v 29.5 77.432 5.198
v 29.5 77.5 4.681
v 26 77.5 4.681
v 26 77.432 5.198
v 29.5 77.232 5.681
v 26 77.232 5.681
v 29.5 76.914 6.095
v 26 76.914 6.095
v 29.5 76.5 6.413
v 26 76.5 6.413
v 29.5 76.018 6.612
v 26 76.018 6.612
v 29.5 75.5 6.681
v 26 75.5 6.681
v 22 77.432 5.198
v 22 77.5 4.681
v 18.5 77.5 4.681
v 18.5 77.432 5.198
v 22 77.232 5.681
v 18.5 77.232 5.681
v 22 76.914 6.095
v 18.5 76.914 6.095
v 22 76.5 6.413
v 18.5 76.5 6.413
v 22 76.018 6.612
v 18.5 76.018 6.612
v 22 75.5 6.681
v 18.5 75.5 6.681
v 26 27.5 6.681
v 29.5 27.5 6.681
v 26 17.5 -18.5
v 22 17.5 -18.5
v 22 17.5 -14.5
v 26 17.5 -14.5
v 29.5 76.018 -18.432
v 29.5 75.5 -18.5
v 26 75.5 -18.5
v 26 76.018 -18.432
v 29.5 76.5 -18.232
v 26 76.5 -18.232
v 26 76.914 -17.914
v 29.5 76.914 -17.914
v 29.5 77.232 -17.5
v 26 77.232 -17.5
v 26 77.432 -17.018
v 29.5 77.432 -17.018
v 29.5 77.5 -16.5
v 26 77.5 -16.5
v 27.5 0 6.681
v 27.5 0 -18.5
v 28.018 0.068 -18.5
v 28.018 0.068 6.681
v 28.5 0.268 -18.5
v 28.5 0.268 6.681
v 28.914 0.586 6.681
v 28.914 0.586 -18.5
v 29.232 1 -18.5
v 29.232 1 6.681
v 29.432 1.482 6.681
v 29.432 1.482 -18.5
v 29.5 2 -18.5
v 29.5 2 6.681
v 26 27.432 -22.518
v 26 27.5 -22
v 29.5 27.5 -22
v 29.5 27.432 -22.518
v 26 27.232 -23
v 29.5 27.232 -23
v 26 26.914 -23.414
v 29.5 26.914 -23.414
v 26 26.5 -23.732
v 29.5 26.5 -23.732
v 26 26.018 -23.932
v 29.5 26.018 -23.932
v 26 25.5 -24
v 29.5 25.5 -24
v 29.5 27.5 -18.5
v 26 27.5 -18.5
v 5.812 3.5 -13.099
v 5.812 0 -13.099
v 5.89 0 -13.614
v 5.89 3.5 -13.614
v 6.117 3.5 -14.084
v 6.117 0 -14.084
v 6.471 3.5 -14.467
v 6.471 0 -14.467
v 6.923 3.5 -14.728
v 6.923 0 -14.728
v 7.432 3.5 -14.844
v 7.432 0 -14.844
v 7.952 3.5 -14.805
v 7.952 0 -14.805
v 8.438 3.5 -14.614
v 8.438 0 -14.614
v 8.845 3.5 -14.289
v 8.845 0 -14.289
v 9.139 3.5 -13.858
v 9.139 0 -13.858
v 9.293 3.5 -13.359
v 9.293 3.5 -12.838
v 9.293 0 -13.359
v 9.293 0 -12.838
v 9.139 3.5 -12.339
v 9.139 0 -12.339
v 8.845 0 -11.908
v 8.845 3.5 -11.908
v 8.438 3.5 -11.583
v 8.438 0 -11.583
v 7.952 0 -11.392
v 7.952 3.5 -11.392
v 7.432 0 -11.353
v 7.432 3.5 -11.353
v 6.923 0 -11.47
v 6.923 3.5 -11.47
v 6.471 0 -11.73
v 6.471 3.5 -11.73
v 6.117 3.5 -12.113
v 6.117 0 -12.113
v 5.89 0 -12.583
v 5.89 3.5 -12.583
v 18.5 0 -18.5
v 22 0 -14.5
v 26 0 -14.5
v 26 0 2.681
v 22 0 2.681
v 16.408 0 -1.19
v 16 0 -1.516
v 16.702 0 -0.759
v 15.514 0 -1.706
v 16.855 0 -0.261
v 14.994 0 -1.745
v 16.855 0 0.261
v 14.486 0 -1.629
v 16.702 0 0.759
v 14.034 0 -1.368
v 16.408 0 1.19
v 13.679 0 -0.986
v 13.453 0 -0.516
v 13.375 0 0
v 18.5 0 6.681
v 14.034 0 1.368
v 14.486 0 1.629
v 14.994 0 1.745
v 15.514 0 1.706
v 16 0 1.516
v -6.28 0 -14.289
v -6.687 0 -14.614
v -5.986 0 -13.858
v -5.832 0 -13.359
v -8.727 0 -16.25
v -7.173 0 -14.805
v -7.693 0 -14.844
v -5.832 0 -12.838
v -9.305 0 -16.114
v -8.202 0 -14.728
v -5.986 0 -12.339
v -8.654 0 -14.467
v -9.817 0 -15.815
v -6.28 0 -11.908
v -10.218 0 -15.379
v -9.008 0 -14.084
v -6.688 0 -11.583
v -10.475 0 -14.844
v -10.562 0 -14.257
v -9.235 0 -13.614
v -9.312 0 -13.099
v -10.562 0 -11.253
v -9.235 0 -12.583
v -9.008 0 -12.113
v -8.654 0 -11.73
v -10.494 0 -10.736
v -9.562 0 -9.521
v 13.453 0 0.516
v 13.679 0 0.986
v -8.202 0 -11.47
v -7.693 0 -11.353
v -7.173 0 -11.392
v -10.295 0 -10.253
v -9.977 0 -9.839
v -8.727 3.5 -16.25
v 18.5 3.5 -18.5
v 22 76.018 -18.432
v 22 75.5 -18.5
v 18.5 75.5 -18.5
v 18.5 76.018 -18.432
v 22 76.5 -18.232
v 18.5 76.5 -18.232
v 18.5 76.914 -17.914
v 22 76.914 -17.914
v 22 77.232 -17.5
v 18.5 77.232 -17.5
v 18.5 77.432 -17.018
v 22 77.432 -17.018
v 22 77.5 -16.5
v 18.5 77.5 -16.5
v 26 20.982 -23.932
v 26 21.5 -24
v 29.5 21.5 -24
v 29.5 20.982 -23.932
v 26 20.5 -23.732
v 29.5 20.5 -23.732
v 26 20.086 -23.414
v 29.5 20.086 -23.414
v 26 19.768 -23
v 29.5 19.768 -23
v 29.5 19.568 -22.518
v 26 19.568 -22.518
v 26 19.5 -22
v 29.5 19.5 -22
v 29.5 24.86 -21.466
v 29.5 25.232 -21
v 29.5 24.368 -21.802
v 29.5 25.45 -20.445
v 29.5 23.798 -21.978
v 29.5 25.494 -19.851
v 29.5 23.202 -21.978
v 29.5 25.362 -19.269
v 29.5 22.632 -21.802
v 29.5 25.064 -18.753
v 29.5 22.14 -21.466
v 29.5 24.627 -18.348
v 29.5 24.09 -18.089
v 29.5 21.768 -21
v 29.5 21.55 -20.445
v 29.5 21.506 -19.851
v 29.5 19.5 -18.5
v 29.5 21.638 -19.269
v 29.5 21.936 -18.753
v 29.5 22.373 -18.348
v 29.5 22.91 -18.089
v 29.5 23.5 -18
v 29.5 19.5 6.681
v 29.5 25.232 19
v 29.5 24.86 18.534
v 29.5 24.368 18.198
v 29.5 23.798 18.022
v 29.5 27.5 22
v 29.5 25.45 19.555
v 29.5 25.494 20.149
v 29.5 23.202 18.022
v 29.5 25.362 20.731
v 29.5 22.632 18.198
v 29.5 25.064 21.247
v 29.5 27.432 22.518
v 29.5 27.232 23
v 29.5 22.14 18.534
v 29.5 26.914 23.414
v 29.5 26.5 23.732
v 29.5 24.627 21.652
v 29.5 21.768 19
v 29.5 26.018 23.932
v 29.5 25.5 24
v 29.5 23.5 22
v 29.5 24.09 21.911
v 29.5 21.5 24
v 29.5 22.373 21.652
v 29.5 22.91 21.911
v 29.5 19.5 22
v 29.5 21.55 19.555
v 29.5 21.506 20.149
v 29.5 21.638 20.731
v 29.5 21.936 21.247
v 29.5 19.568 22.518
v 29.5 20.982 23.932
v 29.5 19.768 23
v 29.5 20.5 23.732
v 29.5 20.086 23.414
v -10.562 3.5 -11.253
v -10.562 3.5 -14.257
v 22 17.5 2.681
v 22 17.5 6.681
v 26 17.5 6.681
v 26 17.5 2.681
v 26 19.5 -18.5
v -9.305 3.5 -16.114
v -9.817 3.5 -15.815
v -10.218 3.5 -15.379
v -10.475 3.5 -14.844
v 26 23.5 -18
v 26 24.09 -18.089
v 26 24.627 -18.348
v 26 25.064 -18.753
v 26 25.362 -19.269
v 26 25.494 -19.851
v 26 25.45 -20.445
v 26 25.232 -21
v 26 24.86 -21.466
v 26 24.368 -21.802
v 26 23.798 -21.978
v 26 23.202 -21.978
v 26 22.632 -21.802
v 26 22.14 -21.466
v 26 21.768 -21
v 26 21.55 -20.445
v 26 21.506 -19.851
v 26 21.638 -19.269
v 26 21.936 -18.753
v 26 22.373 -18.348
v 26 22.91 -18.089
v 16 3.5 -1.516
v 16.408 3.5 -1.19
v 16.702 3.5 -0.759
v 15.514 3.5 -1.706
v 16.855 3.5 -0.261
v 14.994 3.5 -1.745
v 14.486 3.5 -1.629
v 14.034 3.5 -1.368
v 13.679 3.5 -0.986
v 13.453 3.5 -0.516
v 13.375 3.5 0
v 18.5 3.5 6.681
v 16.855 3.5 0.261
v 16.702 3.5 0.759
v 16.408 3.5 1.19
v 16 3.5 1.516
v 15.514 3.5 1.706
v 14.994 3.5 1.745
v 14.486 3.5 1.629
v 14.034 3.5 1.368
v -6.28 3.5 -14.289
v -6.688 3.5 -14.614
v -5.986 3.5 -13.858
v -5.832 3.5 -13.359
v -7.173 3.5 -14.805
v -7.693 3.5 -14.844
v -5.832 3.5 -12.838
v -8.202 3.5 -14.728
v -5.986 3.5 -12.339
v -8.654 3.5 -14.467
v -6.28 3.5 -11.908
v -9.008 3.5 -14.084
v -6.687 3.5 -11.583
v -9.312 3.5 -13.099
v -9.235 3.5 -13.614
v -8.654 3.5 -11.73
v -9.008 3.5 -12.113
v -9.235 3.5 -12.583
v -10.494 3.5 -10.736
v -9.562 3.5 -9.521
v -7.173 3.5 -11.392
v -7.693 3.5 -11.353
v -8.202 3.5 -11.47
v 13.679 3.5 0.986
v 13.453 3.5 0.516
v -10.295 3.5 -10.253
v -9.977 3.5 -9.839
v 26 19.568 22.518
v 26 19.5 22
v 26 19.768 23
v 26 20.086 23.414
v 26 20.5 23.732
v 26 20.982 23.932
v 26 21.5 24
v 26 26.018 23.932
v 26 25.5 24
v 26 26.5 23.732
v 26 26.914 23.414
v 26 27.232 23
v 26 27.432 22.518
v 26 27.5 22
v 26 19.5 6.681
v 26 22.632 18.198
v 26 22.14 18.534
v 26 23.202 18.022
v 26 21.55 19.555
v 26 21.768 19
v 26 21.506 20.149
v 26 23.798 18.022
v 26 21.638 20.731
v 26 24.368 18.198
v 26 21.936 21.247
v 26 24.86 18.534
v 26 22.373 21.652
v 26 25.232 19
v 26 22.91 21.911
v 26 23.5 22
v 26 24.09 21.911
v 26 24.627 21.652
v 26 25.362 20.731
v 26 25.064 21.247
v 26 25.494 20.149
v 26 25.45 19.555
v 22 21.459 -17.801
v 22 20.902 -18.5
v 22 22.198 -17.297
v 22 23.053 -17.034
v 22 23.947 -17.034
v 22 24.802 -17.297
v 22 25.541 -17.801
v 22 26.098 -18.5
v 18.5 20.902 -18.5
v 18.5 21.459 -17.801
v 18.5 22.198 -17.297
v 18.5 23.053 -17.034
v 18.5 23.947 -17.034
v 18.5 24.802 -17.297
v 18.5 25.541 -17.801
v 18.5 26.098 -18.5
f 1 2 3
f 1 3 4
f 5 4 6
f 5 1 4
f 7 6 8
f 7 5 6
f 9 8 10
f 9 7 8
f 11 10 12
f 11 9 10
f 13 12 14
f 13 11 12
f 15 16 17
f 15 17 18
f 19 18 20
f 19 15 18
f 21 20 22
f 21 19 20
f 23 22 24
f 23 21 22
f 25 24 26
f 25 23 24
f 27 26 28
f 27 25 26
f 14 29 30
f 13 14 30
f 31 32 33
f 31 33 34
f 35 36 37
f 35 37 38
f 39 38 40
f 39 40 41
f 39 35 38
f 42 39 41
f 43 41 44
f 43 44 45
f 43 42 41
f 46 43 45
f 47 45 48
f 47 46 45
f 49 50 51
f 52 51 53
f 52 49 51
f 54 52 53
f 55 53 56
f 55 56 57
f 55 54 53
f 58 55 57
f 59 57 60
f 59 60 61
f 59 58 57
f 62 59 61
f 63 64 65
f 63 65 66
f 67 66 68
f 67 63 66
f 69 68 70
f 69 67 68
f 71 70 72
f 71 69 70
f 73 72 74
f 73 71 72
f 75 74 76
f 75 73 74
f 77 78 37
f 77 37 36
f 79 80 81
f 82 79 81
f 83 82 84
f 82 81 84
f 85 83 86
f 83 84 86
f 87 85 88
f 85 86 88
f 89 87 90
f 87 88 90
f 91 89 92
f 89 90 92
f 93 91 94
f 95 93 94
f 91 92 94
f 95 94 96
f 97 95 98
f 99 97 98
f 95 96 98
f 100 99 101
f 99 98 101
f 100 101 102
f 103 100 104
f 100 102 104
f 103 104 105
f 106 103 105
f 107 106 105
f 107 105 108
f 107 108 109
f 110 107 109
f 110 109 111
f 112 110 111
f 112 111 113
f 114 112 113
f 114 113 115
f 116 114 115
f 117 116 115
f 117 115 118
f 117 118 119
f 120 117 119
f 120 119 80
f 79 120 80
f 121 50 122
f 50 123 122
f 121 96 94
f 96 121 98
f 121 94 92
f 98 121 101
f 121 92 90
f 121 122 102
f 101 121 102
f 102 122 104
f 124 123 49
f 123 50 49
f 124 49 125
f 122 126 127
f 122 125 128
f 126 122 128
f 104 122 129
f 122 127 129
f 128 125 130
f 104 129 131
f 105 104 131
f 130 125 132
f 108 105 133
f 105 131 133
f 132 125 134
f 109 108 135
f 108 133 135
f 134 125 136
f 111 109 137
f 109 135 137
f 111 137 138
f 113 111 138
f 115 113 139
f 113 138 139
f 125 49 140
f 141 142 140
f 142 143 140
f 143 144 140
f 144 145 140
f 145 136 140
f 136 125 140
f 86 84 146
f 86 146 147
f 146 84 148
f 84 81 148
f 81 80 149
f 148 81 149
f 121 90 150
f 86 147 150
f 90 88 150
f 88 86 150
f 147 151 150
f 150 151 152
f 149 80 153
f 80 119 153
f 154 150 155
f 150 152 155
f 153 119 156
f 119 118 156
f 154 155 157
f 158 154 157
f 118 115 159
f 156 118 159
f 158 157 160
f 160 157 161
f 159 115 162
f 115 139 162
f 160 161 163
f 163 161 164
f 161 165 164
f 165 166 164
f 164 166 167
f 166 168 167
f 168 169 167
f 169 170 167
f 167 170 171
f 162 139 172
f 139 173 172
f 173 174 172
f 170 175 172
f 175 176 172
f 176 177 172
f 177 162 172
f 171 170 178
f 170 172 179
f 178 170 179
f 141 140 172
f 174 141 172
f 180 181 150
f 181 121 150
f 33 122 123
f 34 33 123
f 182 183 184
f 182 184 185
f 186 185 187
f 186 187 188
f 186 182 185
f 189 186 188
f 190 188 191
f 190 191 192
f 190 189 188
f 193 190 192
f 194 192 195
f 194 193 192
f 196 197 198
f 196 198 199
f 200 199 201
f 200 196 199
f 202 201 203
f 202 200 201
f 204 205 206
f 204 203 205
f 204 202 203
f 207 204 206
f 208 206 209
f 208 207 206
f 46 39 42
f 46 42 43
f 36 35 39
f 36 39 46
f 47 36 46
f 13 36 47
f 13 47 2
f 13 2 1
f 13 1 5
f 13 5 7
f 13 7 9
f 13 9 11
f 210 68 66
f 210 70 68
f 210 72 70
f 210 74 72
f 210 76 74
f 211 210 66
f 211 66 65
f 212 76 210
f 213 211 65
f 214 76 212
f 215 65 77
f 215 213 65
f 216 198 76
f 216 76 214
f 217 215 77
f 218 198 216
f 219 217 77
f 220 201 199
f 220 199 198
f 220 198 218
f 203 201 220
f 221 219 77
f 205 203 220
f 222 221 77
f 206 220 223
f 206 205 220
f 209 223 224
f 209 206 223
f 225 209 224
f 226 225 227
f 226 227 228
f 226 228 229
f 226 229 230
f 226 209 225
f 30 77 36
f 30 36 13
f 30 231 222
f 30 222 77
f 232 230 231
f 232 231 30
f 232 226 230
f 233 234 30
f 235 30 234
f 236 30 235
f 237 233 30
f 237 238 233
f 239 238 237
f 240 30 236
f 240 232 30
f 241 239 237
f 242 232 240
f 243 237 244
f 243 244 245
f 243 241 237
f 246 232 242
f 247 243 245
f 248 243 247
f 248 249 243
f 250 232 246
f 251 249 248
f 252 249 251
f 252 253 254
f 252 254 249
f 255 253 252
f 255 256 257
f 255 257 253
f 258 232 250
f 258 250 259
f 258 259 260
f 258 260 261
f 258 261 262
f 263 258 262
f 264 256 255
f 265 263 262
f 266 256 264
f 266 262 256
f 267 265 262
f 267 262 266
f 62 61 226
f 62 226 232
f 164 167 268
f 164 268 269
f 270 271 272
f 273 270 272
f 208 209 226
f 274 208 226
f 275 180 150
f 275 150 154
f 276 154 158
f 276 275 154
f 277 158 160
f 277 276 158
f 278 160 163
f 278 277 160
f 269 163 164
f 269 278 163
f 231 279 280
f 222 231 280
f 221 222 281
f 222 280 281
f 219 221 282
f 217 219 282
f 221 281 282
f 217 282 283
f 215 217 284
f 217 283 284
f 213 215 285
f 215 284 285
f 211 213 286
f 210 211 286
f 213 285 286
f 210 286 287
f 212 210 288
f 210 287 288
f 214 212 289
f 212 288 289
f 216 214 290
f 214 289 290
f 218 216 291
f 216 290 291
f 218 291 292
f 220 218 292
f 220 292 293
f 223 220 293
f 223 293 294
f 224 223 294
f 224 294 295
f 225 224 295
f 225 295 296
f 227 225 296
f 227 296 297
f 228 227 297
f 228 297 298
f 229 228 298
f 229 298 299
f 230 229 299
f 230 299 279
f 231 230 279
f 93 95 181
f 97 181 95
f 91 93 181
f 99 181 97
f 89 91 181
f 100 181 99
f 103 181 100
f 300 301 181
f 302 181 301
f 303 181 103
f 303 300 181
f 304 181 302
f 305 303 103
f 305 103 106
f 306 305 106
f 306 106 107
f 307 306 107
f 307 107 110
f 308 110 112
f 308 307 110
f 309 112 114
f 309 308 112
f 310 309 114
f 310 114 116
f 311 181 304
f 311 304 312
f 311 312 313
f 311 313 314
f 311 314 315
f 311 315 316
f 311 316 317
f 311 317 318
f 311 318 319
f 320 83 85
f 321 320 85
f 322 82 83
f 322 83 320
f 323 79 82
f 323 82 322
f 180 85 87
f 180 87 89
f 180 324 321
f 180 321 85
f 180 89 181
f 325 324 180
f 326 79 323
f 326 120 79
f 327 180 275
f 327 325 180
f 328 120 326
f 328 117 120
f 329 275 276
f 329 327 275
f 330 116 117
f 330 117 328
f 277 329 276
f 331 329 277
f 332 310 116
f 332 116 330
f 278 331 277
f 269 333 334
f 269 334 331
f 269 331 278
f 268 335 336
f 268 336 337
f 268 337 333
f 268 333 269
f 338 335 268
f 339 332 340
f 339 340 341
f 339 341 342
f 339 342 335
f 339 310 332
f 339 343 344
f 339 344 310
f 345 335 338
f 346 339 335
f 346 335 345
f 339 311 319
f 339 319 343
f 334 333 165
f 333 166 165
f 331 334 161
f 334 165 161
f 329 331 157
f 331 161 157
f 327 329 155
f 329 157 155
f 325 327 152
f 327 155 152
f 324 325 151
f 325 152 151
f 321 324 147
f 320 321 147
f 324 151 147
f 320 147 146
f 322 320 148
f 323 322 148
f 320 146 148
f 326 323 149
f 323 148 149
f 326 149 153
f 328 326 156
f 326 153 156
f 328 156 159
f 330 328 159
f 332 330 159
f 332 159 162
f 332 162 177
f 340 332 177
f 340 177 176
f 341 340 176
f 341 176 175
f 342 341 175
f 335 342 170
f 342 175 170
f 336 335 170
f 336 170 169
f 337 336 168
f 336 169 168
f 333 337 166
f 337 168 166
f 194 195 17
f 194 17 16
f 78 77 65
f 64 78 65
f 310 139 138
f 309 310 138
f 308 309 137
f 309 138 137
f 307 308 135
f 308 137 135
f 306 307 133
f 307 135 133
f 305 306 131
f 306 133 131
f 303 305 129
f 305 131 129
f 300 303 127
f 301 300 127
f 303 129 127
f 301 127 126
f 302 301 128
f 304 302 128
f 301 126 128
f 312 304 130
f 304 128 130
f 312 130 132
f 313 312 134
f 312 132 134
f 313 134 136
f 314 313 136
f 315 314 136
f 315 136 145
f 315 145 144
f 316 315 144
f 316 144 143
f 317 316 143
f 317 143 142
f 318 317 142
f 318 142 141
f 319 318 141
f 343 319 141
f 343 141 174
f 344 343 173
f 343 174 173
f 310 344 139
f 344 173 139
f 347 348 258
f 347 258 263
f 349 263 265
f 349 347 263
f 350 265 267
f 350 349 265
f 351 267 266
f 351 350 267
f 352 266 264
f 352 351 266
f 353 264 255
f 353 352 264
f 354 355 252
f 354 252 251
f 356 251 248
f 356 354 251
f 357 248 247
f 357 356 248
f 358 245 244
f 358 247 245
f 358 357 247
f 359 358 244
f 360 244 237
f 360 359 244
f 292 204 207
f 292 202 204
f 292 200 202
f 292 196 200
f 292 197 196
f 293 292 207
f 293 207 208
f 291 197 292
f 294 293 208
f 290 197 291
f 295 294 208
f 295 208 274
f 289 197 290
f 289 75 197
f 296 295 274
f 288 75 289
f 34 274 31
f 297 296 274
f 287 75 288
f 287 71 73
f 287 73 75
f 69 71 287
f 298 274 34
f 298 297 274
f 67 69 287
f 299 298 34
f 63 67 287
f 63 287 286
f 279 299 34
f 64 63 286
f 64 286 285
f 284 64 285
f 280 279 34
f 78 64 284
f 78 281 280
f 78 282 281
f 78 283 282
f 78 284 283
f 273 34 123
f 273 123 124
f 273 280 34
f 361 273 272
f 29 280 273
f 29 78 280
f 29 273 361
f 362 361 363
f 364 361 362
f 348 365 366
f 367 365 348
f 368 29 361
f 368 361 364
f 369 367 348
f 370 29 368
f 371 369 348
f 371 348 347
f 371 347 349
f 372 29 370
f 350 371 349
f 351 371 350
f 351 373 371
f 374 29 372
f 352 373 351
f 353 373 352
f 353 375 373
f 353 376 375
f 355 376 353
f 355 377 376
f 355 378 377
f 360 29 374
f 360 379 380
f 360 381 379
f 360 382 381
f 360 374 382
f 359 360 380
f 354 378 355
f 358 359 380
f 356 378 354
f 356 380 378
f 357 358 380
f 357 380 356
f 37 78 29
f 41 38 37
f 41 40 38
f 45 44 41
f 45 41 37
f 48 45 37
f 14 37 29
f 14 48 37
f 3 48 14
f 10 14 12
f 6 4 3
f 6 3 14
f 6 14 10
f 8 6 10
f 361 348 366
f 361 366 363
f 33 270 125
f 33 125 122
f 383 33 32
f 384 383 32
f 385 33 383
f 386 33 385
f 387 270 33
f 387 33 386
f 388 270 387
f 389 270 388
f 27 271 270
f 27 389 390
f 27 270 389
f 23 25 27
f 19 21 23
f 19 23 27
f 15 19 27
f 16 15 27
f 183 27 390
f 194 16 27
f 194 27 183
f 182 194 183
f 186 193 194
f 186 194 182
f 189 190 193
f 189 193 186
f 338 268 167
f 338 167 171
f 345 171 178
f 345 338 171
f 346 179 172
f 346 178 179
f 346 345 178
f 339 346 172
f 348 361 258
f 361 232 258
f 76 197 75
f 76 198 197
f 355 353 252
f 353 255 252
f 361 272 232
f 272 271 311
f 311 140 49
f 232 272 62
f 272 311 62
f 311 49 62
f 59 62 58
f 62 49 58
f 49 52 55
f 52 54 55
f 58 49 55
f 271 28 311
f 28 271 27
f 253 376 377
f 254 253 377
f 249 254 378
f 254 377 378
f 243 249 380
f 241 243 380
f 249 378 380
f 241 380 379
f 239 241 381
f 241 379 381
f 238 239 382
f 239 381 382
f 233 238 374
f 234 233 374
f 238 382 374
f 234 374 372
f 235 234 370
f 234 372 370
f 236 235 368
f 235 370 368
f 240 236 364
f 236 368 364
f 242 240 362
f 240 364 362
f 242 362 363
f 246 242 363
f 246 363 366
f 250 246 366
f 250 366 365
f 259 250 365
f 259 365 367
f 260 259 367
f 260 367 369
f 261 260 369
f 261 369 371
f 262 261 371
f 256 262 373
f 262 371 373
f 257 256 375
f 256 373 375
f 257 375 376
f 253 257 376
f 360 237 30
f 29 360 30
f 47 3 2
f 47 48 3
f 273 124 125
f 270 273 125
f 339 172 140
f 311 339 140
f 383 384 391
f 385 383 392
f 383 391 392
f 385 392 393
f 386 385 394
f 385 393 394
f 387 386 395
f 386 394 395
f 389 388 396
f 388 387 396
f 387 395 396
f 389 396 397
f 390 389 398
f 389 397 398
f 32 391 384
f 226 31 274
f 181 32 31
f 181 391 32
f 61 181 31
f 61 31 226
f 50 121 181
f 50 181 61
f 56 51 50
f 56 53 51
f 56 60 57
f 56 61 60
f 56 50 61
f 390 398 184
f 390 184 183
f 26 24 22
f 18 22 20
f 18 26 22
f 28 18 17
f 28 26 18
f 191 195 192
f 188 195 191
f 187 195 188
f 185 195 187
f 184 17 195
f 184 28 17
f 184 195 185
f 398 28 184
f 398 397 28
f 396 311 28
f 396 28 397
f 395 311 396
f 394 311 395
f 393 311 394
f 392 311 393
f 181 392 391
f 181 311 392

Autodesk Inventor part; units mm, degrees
ref_plane "YZ Plane" through (0, 0, 0) normal (1, 0, 0) x (0, 1, 0)
ref_plane "XZ Plane" through (0, 0, 0) normal (0, 1, 0) x (-1, 0, 0)
ref_plane "XY Plane" through (0, 0, 0) normal (0, 0, 1) x (1, 0, 0)
sketch "Szkic1" plane through (0, 0, 0) normal (0, 1, 0) x (-1, 0, 0)
  circle A0 centre (0, 0) radius 18.5
  circle A1 centre (0, 0) radius 15.125
  line L0 (15.125, 0) -> (7.5625, -13.0986)
  line L1 (7.5625, -13.0986) -> (-7.5625, -13.0986)
  line L2 (-7.5625, -13.0986) -> (-15.125, 0)
  line L3 (-15.125, 0) -> (-7.5625, 13.0986)
  line L4 (-7.5625, 13.0986) -> (7.5625, 13.0986)
  line L5 (7.5625, 13.0986) -> (15.125, 0)
  circle A2 centre (-15.125, 0) radius 1.75
  circle A3 centre (-7.5625, -13.0986) radius 1.75
  circle A4 centre (7.5625, -13.0986) radius 1.75
  line L6 (-18.5, 0) -> (-29.5, 0)
  line L7 (-29.5, 0) -> (-29.5, -18.5)
  line L8 (-29.5, -18.5) -> (-18.5, -18.5)
  line L9 (-18.5, -18.5) -> (-18.5, 0)
  line L10 (-29.5, -18.5) -> (-26, -18.5)
  line L11 (-26, -18.5) -> (-26, 0)
  line L12 (-26, 0) -> (-29.5, 0)
  line L13 (-29.5, 0) -> (-29.5, -18.5)
  line L14 (-26, -18.5) -> (-22, -18.5)
  line L15 (-22, -18.5) -> (-22, 0)
  line L16 (-22, 0) -> (-26, 0)
  line L17 (-26, 0) -> (-26, -18.5)
  line L18 (-18.5, 0) -> (-29.5, 0)
  line L19 (-29.5, 0) -> (-29.5, 15)
  line L20 (7.5625, -13.0986) -> (-18.5, -13.0986)
  line L21 (-18.5, -13.0986) -> (-18.5, -16.0986)
  line L22 (-18.5, -16.0986) -> (7.5625, -16.0986)
  line L23 (7.5625, -16.0986) -> (7.5625, -13.0986)
  line L24 (7.5625, -10.0986) -> (7.5625, -16.0986)
  line L25 (7.5625, -10.0986) -> (-18.5, -10.0986)
  line L26 (-18.5, -10.0986) -> (-18.5, -13.0986)
  line L27 (-18.5, -13.0986) -> (7.5625, -13.0986)
  line L28 (7.5625, -13.0986) -> (7.5625, -10.0986)
  line L29 (7.5625, -10.0986) -> (10.5625, -10.0986)
  line L30 (10.5625, -10.0986) -> (10.5625, -16.0986)
  line L31 (10.5625, -16.0986) -> (7.5625, -16.0986)
  line L32 (7.5625, -16.0986) -> (7.5625, -10.0986)
  line L33 (10.5625, -10.0986) -> (-18.5, 6.6806)
  line L34 (-18.5, -18.5) -> (10.5625, -16.0986)
  line L35 (-18.5, 6.6806) -> (-29.5, 13.0315)
  line L36 (-29.5, 0) -> (-18.5, 0)
  line L37 (-18.5, 0) -> (-18.5, 6.6806)
  line L38 (-18.5, 6.6806) -> (-29.5, 6.6806)
  line L39 (-29.5, 6.6806) -> (-29.5, 0)
  point P0 (-9.3125, -13.0986)
  point P1 (-5.8125, -13.0986)
  point P2 (5.8125, -13.0986)
  point P3 (7.5625, -14.8486)
  dimension "d0" = 37
  dimension "d1" = 30.25
  dimension "d2" = 3.5
  dimension "d3" = 3.5
  dimension "d4" = 3.5
  dimension "d5" = 11
  dimension "d6" = 3.5
  dimension "d7" = 4
  dimension "d9" = 3
  dimension "d10" = 3
  dimension "d12" = 3
  dimension "d13" = 30
extrude "Wyciągnięcie proste1" add sketch "Szkic1" along normal blind 3.5 contours L33 A1 A2 L25 A0 | A0 L37 L33 | L30 L31 A0 | A0 L31 L23 A4 A1 L30 | L9 L8 L15 L6 | A0 L25 L9 | L6 L19 L38 L37 | L33 L3 A2 A1 | L31 L34 A0 | A0 L34 L22 L31 | A1 A4 L0 L29 L30 | L25 A1 A3 L20 A0 | A0 L20 L9 L25 | L15 L8 L11 L6 | L33 L0 L29 L25 L2 A2 L3 | L22 A0 L20 A3 A1 A4 L23 | L29 L0 L33 | A0 L22 L9 L20 | L25 L2 A3 A1 | A1 A2 L2 L25 | L11 L8 L7 L6 | L34 L9 L22 A0 | A4 L24 L29 L0 | L25 L24 A4 L1 A3 L2 | A1 A3 L1 A4
sketch "Szkic2" plane through (0, 3.5, 0) normal (0, 1, 0) x (1, 0, 0)
  line L0 (18.5, -6.6806) -> (29.5, -6.6806) projected
  line L1 (18.5, 18.5) -> (-10.5625, 16.0986) projected
  line L2 (29.5, -6.6806) -> (18.5, -6.6806)
  line L3 (18.5, -6.6806) -> (18.5, 18.5)
  line L4 (18.5, 18.5) -> (29.5, 18.5)
  line L5 (29.5, 18.5) -> (29.5, -6.6806)
  point P0 (0, 0)
extrude "Wyciągnięcie proste2" add sketch "Szkic2" along normal blind 74
sketch "Szkic3" plane through (0, 77.5, 0) normal (0, 1, 0) x (1, 0, 0)
  line L0 (18.5, -6.6806) -> (29.5, -6.6806) projected
  line L1 (29.5, 18.5) -> (18.5, 18.5) projected
  line L2 (26, -6.6806) -> (22, -6.6806)
  line L3 (22, -6.6806) -> (22, 18.5)
  line L4 (22, 18.5) -> (26, 18.5)
  line L5 (26, 18.5) -> (26, -6.6806)
  line L6 (18.5, 18.5) -> (18.5, -6.6806) projected
  point P0 (0, 0)
  dimension "d21" = 4
  dimension "d22" = 3.5
extrude "Wyciągnięcie proste3" cut sketch "Szkic3" against normal blind 60 contours L3 L1 L5 L0
sketch "Szkic4" plane through (0, 17.5, 0) normal (0, 1, 0) x (1, 0, 0)
  line L0 (26, 18.5) -> (26, -6.6806) projected
  line L1 (22, -6.6806) -> (22, 18.5) projected
  line L2 (22, 0) -> (22, 11.8194)
  line L3 (26, 11.8194) -> (26, 0)
  line L4 (26, -6.6806) -> (22, -6.6806) projected
  line L5 (22, 18.5) -> (26, 18.5) projected
  line L6 (22, 14.5) -> (26, 14.5)
  line L7 (26, 14.5) -> (26, -2.6806)
  line L8 (26, -2.6806) -> (22, -2.6806)
  line L9 (22, -2.6806) -> (22, 14.5)
  point P0 (0, 0)
  dimension "d29" = 4
  dimension "d30" = 4
extrude "Wyciągnięcie proste4" cut sketch "Szkic4" against normal blind 60 contours L0 L8 L1 L6
sketch "Szkic8" plane through (29.5, 0, 6.6806) normal (1, 0, 0) x (0, 0, -1)
  line L0 (-17, 23.5) -> (25.1806, 23.5)
  line L1 (25.1806, 0) -> (25.1806, 77.5) projected
  line L2 (6.6806, 0) -> (6.6806, 23.5)
  line L3 (6.6806, 18.5) -> (30.6806, 18.5)
  line L4 (30.6806, 18.5) -> (30.6806, 28.5)
  line L5 (30.6806, 28.5) -> (6.6806, 28.5)
  line L6 (6.6806, 28.5) -> (6.6806, 18.5)
  line L7 (6.6806, 18.5) -> (-17.3194, 18.5)
  line L8 (-17.3194, 18.5) -> (-17.3194, 28.5)
  line L9 (-17.3194, 28.5) -> (6.6806, 28.5)
  line L10 (6.6806, 28.5) -> (6.6806, 18.5)
  line L11 (30.6806, 23.5) -> (-17.3194, 23.5)
  line L12 (30.6806, 19.5) -> (-17.3194, 19.5)
  line L13 (-17.3194, 19.5) -> (-17.3194, 27.5)
  line L14 (-17.3194, 27.5) -> (30.6806, 27.5)
  line L15 (30.6806, 27.5) -> (30.6806, 19.5)
  point P0 (25.1806, 28.5)
  point P1 (25.1806, 18.5)
  point P2 (25.1806, 27.5)
  point P3 (25.1806, 19.5)
  point P4 (6.6806, 27.5)
  point P5 (6.6806, 19.5)
  dimension "d39" = 24
  dimension "d40" = 24
  dimension "d47" = 1
  dimension "d48" = 1
extrude "Wyciągnięcie proste6" add sketch "Szkic8" against normal blind 3.5 contours L11 L8 L14 L6 L0 | L0 L2 L12 L8 L11 | L11 L4 L12 L1 | L1 L14 L4 L11
sketch "Szkic9" plane through (26, 77.5, -18.5) normal (-1, 0, 0) x (0, 0, 1)
  line L0 (42.5, -58) -> (42.5, -50) projected
  line L1 (42.5, -54) -> (38.5, -54)
  circle A0 centre (38.5, -54) radius 2
  line L2 (-5.5, -50) -> (-5.5, -58) projected
  line L3 (-5.5, -54) -> (-1.5, -54)
  circle A1 centre (-1.5, -54) radius 2
  point P0 (18.5, -77.5)
  point P1 (42.5, -59)
  point P2 (42.5, -49)
  point P3 (-5.5, -49)
  point P4 (-5.5, -59)
  dimension "d43" = 4
  dimension "d44" = 4
  dimension "d45" = 4
  dimension "d46" = 4
extrude "Wyciągnięcie proste7" cut sketch "Szkic9" along normal mid plane 50
fillet "Zaokrąglenie3" radius 2 11 edges at (-10.5625, 1.75, -16.0986) (-10.5625, 1.75, -10.0986) (29.5, 0, -5.9097) (27.75, 19.5, 24) (27.75, 27.5, 24) (27.75, 19.5, -24) (27.75, 27.5, -24) (27.75, 77.5, -18.5) (27.75, 77.5, 6.6806) (20.25, 77.5, 6.6806) (20.25, 77.5, -18.5)
sketch "Szkic10" plane through (18.5, 3.5, -18.5) normal (-1, 0, 0) x (0, 0, 1)
  circle A0 centre (-1.5, 20) radius 2 projected
  circle A1 centre (-1.5, 20) radius 3
  point P0 (18.5, -3.5)
  dimension "d52" = 6
extrude "Wyciągnięcie proste8" cut sketch "Szkic10" against normal blind 4 contours A0 | A1
sketch "Szkic11" plane through (29.5, 21.5, 24) normal (1, 0, 0) x (0, 0, -1)
  circle A0 centre (44, 2) radius 2 projected
  line L0 (4.0189, 2) -> (44, 2)
  point P0 (24, -21.5)
  dimension "d55" = 39.9811
properties part number "nasilnikprzod1_new"
